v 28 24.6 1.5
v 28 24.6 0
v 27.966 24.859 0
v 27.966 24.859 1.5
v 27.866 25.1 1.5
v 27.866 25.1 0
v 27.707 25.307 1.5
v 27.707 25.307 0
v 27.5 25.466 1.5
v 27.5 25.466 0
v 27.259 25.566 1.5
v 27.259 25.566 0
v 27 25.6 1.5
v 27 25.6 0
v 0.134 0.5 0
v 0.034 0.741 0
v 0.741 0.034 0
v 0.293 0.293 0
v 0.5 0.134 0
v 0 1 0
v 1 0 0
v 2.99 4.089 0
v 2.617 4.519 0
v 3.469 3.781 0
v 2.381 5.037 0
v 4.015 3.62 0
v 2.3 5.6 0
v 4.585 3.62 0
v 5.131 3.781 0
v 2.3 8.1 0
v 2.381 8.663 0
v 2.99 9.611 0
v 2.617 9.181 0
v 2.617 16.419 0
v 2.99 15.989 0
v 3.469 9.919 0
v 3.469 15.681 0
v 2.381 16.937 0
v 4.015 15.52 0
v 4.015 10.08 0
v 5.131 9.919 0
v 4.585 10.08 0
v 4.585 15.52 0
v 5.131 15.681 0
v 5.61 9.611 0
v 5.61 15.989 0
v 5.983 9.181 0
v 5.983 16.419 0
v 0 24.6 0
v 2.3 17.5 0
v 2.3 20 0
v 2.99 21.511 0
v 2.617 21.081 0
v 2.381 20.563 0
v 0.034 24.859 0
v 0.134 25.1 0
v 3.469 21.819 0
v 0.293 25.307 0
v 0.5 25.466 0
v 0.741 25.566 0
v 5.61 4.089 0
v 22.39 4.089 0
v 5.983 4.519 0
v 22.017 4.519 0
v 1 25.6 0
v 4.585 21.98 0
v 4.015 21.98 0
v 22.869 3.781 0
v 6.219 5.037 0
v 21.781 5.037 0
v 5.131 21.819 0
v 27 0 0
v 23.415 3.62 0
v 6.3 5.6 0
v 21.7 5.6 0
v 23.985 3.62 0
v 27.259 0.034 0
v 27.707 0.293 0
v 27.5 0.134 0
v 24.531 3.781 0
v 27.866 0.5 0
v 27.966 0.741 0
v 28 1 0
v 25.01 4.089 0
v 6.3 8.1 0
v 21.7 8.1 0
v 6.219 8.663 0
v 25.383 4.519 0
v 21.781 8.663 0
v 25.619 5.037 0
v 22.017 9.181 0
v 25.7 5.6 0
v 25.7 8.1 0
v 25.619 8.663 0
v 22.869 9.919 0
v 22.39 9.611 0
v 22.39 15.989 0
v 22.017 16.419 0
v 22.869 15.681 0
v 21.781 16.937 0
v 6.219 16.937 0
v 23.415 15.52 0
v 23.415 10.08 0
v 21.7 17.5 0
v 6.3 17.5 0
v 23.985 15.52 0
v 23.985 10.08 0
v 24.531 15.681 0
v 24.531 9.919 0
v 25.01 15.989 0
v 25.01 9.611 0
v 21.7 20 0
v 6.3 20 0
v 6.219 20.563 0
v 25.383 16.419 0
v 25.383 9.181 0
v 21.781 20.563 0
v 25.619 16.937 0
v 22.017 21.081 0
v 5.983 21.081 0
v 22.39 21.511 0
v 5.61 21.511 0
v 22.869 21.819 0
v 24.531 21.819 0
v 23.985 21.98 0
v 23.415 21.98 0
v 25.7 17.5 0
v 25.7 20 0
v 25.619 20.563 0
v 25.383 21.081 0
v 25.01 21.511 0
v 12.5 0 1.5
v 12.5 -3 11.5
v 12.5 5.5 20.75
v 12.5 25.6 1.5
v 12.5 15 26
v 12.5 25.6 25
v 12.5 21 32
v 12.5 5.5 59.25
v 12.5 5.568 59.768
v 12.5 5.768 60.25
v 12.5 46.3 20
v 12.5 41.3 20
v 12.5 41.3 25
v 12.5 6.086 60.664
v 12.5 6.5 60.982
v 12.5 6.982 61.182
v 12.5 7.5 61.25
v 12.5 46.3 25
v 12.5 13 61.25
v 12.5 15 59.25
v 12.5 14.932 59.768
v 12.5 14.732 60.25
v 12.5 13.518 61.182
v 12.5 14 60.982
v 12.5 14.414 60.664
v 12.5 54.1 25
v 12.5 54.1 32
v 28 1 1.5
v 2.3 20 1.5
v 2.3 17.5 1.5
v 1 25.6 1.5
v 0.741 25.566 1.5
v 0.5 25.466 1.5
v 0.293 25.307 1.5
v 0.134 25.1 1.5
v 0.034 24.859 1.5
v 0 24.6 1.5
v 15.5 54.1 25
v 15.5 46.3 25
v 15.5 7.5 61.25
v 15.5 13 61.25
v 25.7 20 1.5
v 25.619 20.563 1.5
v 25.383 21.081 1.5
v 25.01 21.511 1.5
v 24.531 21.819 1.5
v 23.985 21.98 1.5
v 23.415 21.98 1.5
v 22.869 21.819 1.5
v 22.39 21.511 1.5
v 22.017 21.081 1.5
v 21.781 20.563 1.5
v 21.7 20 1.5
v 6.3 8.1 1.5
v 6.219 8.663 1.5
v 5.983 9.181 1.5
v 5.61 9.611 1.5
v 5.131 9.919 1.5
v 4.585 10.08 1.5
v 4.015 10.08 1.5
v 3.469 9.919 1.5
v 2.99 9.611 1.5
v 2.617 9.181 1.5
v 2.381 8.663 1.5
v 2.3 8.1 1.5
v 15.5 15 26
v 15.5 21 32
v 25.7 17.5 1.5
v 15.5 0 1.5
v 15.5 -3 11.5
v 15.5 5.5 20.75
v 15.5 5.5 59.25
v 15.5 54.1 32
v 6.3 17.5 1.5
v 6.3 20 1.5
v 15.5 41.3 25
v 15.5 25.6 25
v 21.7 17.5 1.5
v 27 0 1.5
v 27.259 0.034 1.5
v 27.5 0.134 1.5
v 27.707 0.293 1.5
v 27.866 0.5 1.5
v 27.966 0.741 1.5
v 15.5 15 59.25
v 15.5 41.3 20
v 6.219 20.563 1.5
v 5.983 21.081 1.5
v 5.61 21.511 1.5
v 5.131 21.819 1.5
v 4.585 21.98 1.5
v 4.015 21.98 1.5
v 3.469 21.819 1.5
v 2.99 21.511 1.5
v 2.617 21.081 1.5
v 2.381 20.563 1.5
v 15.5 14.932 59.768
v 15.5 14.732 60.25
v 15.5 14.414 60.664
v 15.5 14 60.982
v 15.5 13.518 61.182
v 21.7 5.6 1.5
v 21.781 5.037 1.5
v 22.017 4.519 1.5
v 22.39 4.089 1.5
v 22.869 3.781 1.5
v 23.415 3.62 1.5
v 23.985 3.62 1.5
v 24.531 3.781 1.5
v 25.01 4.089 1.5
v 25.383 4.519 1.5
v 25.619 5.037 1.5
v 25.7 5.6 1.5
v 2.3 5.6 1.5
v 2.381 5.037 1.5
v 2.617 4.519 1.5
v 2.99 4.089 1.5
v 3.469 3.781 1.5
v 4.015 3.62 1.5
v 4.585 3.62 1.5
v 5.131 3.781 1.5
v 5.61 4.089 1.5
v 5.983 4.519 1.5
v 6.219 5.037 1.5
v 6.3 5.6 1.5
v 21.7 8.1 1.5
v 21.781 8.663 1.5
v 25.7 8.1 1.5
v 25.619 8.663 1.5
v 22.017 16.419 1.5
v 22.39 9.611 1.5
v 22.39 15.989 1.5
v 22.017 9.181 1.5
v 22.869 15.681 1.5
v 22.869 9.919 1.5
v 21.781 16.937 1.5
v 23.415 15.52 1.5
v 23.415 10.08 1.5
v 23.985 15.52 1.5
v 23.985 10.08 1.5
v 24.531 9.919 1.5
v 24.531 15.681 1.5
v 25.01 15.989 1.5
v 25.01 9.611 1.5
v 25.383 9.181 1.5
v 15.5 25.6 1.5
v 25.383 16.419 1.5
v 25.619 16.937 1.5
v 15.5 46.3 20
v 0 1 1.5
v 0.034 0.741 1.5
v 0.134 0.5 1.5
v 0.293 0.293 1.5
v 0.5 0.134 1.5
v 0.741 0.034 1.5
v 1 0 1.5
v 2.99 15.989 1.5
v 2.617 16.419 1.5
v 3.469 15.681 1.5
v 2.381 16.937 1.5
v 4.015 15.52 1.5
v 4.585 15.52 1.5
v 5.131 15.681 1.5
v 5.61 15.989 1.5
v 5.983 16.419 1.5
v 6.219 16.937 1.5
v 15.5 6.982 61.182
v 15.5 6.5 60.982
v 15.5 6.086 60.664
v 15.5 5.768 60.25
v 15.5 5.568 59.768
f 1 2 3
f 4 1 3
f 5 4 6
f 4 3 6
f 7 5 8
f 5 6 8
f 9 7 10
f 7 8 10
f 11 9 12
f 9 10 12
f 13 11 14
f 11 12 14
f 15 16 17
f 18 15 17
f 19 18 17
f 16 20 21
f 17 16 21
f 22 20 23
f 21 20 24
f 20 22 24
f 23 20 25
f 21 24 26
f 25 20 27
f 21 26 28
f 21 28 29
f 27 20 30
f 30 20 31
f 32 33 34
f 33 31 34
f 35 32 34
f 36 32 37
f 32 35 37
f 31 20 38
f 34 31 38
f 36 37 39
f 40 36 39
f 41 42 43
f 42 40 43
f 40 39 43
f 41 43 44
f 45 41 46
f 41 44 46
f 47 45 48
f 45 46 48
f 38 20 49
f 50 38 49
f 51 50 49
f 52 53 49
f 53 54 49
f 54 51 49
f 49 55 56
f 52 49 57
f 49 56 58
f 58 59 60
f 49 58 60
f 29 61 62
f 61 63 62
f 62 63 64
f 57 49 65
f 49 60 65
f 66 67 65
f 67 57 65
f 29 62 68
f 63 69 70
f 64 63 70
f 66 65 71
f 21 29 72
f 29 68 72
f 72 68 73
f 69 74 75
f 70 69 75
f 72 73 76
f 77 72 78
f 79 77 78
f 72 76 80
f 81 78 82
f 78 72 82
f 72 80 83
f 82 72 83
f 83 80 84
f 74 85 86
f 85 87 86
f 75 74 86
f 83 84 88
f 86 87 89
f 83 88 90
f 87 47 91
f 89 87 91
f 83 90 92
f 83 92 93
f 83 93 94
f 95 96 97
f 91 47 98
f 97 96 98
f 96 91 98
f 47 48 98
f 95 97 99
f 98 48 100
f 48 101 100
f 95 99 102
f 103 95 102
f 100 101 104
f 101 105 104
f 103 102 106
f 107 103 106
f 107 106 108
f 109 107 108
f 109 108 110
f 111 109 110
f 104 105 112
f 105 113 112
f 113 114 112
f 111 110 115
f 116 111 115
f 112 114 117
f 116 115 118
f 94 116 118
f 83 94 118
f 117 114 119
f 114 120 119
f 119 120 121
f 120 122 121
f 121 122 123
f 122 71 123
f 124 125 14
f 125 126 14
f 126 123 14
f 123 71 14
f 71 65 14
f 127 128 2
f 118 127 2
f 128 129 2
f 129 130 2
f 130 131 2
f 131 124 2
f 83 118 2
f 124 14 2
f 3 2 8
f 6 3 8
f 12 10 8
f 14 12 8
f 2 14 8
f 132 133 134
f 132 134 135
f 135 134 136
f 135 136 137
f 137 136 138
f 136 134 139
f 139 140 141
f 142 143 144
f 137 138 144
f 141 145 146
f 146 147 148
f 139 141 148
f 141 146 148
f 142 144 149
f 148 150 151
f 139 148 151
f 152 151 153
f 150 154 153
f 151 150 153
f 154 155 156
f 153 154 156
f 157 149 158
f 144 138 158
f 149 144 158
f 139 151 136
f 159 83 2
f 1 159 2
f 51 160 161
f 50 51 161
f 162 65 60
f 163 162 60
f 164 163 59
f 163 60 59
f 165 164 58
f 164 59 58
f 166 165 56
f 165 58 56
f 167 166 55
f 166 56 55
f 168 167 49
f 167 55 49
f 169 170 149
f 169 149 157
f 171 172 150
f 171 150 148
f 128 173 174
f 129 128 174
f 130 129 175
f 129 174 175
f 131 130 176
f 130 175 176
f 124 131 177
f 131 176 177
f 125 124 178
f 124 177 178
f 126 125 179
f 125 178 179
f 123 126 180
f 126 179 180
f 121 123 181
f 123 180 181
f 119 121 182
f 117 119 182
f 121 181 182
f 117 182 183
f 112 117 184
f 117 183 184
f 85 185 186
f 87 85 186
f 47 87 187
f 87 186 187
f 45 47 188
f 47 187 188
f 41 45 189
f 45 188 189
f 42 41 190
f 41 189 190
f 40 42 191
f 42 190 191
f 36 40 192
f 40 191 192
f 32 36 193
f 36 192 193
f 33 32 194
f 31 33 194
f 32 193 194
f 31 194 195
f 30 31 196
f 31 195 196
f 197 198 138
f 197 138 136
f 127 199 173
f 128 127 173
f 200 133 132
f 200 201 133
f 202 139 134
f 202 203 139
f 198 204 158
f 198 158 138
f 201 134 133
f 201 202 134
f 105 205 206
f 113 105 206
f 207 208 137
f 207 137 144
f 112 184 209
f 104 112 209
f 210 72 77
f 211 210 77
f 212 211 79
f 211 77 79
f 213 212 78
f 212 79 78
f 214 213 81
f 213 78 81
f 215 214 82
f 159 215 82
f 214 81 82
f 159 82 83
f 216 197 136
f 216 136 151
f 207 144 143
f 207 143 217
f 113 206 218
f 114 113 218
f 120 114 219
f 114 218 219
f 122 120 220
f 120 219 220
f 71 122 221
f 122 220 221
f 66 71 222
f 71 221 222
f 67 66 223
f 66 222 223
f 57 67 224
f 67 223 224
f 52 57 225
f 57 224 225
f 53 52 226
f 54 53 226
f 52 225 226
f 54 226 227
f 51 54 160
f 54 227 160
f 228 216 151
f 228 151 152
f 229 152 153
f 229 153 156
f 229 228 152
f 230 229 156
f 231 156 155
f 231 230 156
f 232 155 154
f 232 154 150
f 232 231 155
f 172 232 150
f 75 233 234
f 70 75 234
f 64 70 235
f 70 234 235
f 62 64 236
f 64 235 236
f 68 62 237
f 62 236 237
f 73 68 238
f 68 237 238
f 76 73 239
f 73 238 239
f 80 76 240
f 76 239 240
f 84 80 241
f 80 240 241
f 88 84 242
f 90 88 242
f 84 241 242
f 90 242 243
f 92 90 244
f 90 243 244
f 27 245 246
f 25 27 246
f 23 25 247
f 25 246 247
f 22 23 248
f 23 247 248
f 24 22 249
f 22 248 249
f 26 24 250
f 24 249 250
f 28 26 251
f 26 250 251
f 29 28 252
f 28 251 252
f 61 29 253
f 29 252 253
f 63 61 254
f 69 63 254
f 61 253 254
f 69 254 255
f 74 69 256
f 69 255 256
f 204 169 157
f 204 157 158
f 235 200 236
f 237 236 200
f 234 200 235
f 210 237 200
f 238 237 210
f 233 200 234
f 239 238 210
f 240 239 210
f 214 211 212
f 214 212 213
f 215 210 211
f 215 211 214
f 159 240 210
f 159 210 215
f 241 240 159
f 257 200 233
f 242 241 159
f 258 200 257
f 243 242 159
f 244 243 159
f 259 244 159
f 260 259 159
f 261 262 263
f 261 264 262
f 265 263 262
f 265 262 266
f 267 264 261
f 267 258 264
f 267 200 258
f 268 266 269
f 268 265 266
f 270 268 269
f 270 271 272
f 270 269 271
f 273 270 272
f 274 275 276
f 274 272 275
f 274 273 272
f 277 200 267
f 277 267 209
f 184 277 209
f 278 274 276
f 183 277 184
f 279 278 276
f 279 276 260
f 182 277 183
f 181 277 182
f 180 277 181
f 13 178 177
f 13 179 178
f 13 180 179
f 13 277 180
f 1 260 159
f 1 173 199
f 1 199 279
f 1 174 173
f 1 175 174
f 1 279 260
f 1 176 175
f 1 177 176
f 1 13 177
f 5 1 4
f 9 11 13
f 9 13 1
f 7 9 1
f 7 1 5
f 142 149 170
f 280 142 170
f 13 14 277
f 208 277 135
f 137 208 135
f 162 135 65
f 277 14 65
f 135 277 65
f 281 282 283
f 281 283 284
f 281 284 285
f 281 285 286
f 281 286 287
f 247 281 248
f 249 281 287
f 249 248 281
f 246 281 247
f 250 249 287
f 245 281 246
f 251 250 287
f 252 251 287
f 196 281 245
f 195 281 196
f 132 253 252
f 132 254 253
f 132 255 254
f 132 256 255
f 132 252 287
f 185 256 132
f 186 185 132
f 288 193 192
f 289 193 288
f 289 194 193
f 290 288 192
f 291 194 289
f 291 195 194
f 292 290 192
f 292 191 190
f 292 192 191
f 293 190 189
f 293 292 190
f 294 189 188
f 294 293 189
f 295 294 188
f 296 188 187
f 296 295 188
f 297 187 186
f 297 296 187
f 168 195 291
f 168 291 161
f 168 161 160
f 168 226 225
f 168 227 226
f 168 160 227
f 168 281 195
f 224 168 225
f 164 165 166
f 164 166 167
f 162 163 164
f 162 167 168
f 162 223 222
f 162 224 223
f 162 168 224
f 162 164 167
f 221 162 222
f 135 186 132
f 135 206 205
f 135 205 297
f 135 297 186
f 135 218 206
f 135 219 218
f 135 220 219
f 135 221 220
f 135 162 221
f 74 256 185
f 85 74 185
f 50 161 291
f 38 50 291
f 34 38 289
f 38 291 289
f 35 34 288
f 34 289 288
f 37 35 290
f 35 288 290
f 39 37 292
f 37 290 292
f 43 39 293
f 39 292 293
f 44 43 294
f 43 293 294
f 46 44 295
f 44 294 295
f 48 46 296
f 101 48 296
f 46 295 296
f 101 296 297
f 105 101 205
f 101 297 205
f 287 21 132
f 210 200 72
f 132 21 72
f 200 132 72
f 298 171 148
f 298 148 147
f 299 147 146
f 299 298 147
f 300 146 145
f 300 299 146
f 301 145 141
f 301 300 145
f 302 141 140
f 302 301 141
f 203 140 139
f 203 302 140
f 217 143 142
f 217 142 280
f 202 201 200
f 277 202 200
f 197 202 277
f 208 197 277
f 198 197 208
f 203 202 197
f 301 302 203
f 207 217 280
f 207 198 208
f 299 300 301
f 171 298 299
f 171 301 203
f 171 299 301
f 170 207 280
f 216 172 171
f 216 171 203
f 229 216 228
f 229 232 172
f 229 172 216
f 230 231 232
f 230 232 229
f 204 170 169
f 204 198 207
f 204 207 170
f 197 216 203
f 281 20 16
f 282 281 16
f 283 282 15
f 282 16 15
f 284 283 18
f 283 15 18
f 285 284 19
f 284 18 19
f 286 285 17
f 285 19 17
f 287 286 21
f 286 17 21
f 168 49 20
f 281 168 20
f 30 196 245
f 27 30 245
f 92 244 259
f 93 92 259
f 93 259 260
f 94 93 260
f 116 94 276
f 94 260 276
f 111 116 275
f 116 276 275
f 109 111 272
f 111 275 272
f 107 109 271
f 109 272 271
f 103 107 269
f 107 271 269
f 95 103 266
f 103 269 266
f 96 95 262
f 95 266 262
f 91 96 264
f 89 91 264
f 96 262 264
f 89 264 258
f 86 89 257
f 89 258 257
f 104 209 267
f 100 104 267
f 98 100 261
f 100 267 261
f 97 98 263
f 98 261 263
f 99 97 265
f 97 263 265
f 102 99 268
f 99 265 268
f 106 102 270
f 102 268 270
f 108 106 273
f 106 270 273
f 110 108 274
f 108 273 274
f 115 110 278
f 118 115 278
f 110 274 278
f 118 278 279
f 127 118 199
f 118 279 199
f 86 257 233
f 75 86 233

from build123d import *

# Parameters (mm, degrees)
F1_DEPTH = 1.5
F3_DEPTH = 25
F6_DEPTH = 1.5
F7_W     = 3
F7_H     = 5
F8_DEPTH = 5


with BuildPart() as f1:
    # F0 (on Top) → F1 (new body)
    with BuildSketch(Plane.XY):
        with BuildLine():
            ThreePointArc((0, 1), (0.292893, 0.292893), (1, 0))
            Line((1, 0), (27, 0))
            ThreePointArc((27, 0), (27.707107, 0.292893), (28, 1))
            Line((28, 1), (28, 24.6))
            ThreePointArc((28, 24.6), (27.707107, 25.307107), (27, 25.6))
            Line((27, 25.6), (1, 25.6))
            ThreePointArc((1, 25.6), (0.292893, 25.307107), (0, 24.6))
            Line((0, 24.6), (0, 1))
        make_face()
    extrude(amount=F1_DEPTH)

    # F2 (on face) → F3 (cut)
    with BuildSketch(Plane.XY.offset(1.5)):
        with BuildLine():
            Line((6.3, 17.5), (6.3, 20))
            ThreePointArc((6.3, 20), (4.3, 22), (2.3, 20))
            Line((2.3, 20), (2.3, 17.5))
            ThreePointArc((2.3, 17.5), (4.3, 15.5), (6.3, 17.5))
        make_face()
        with BuildLine():
            Line((6.3, 5.6), (6.3, 8.1))
            ThreePointArc((6.3, 8.1), (4.3, 10.1), (2.3, 8.1))
            Line((2.3, 8.1), (2.3, 5.6))
            ThreePointArc((2.3, 5.6), (4.3, 3.6), (6.3, 5.6))
        make_face()
        with BuildLine():
            Line((25.7, 5.6), (25.7, 8.1))
            ThreePointArc((25.7, 8.1), (23.7, 10.1), (21.7, 8.1))
            Line((21.7, 8.1), (21.7, 5.6))
            ThreePointArc((21.7, 5.6), (23.7, 3.6), (25.7, 5.6))
        make_face()
        with BuildLine():
            Line((25.7, 17.5), (25.7, 20))
            ThreePointArc((25.7, 20), (23.7, 22), (21.7, 20))
            Line((21.7, 20), (21.7, 17.5))
            ThreePointArc((21.7, 17.5), (23.7, 15.5), (25.7, 17.5))
        make_face()
    extrude(amount=-F3_DEPTH, mode=Mode.SUBTRACT)

    # F5 (on offset) → F6 (join, symmetric)
    with BuildSketch(Plane.YZ.offset(14)):
        with BuildLine():
            Line((-3, 11.5), (0, 1.5))
            Line((0, 1.5), (25.6, 1.5))
            Line((25.6, 1.5), (25.6, 25))
            Line((25.6, 25), (54.1, 25))
            Line((54.1, 25), (54.1, 32))
            Line((54.1, 32), (21, 32))
            Line((21, 32), (15, 26))
            Line((15, 26), (15, 59.25))
            ThreePointArc((15, 59.25), (14.414214, 60.664214), (13, 61.25))
            Line((13, 61.25), (7.5, 61.25))
            ThreePointArc((7.5, 61.25), (6.085786, 60.664214), (5.5, 59.25))
            Line((5.5, 59.25), (5.5, 20.75))
            Line((5.5, 20.75), (-3, 11.5))
        make_face()
    extrude(amount=F6_DEPTH, both=True)

    # F7 (on face) → F8 (join)
    with BuildSketch(Plane(origin=(0, 0, 25), x_dir=(1, 0, 0), z_dir=(0, 0, -1))):
        with Locations((14, -43.8)):
            Rectangle(F7_W, F7_H)
    extrude(amount=F8_DEPTH)


solid = f1.part
